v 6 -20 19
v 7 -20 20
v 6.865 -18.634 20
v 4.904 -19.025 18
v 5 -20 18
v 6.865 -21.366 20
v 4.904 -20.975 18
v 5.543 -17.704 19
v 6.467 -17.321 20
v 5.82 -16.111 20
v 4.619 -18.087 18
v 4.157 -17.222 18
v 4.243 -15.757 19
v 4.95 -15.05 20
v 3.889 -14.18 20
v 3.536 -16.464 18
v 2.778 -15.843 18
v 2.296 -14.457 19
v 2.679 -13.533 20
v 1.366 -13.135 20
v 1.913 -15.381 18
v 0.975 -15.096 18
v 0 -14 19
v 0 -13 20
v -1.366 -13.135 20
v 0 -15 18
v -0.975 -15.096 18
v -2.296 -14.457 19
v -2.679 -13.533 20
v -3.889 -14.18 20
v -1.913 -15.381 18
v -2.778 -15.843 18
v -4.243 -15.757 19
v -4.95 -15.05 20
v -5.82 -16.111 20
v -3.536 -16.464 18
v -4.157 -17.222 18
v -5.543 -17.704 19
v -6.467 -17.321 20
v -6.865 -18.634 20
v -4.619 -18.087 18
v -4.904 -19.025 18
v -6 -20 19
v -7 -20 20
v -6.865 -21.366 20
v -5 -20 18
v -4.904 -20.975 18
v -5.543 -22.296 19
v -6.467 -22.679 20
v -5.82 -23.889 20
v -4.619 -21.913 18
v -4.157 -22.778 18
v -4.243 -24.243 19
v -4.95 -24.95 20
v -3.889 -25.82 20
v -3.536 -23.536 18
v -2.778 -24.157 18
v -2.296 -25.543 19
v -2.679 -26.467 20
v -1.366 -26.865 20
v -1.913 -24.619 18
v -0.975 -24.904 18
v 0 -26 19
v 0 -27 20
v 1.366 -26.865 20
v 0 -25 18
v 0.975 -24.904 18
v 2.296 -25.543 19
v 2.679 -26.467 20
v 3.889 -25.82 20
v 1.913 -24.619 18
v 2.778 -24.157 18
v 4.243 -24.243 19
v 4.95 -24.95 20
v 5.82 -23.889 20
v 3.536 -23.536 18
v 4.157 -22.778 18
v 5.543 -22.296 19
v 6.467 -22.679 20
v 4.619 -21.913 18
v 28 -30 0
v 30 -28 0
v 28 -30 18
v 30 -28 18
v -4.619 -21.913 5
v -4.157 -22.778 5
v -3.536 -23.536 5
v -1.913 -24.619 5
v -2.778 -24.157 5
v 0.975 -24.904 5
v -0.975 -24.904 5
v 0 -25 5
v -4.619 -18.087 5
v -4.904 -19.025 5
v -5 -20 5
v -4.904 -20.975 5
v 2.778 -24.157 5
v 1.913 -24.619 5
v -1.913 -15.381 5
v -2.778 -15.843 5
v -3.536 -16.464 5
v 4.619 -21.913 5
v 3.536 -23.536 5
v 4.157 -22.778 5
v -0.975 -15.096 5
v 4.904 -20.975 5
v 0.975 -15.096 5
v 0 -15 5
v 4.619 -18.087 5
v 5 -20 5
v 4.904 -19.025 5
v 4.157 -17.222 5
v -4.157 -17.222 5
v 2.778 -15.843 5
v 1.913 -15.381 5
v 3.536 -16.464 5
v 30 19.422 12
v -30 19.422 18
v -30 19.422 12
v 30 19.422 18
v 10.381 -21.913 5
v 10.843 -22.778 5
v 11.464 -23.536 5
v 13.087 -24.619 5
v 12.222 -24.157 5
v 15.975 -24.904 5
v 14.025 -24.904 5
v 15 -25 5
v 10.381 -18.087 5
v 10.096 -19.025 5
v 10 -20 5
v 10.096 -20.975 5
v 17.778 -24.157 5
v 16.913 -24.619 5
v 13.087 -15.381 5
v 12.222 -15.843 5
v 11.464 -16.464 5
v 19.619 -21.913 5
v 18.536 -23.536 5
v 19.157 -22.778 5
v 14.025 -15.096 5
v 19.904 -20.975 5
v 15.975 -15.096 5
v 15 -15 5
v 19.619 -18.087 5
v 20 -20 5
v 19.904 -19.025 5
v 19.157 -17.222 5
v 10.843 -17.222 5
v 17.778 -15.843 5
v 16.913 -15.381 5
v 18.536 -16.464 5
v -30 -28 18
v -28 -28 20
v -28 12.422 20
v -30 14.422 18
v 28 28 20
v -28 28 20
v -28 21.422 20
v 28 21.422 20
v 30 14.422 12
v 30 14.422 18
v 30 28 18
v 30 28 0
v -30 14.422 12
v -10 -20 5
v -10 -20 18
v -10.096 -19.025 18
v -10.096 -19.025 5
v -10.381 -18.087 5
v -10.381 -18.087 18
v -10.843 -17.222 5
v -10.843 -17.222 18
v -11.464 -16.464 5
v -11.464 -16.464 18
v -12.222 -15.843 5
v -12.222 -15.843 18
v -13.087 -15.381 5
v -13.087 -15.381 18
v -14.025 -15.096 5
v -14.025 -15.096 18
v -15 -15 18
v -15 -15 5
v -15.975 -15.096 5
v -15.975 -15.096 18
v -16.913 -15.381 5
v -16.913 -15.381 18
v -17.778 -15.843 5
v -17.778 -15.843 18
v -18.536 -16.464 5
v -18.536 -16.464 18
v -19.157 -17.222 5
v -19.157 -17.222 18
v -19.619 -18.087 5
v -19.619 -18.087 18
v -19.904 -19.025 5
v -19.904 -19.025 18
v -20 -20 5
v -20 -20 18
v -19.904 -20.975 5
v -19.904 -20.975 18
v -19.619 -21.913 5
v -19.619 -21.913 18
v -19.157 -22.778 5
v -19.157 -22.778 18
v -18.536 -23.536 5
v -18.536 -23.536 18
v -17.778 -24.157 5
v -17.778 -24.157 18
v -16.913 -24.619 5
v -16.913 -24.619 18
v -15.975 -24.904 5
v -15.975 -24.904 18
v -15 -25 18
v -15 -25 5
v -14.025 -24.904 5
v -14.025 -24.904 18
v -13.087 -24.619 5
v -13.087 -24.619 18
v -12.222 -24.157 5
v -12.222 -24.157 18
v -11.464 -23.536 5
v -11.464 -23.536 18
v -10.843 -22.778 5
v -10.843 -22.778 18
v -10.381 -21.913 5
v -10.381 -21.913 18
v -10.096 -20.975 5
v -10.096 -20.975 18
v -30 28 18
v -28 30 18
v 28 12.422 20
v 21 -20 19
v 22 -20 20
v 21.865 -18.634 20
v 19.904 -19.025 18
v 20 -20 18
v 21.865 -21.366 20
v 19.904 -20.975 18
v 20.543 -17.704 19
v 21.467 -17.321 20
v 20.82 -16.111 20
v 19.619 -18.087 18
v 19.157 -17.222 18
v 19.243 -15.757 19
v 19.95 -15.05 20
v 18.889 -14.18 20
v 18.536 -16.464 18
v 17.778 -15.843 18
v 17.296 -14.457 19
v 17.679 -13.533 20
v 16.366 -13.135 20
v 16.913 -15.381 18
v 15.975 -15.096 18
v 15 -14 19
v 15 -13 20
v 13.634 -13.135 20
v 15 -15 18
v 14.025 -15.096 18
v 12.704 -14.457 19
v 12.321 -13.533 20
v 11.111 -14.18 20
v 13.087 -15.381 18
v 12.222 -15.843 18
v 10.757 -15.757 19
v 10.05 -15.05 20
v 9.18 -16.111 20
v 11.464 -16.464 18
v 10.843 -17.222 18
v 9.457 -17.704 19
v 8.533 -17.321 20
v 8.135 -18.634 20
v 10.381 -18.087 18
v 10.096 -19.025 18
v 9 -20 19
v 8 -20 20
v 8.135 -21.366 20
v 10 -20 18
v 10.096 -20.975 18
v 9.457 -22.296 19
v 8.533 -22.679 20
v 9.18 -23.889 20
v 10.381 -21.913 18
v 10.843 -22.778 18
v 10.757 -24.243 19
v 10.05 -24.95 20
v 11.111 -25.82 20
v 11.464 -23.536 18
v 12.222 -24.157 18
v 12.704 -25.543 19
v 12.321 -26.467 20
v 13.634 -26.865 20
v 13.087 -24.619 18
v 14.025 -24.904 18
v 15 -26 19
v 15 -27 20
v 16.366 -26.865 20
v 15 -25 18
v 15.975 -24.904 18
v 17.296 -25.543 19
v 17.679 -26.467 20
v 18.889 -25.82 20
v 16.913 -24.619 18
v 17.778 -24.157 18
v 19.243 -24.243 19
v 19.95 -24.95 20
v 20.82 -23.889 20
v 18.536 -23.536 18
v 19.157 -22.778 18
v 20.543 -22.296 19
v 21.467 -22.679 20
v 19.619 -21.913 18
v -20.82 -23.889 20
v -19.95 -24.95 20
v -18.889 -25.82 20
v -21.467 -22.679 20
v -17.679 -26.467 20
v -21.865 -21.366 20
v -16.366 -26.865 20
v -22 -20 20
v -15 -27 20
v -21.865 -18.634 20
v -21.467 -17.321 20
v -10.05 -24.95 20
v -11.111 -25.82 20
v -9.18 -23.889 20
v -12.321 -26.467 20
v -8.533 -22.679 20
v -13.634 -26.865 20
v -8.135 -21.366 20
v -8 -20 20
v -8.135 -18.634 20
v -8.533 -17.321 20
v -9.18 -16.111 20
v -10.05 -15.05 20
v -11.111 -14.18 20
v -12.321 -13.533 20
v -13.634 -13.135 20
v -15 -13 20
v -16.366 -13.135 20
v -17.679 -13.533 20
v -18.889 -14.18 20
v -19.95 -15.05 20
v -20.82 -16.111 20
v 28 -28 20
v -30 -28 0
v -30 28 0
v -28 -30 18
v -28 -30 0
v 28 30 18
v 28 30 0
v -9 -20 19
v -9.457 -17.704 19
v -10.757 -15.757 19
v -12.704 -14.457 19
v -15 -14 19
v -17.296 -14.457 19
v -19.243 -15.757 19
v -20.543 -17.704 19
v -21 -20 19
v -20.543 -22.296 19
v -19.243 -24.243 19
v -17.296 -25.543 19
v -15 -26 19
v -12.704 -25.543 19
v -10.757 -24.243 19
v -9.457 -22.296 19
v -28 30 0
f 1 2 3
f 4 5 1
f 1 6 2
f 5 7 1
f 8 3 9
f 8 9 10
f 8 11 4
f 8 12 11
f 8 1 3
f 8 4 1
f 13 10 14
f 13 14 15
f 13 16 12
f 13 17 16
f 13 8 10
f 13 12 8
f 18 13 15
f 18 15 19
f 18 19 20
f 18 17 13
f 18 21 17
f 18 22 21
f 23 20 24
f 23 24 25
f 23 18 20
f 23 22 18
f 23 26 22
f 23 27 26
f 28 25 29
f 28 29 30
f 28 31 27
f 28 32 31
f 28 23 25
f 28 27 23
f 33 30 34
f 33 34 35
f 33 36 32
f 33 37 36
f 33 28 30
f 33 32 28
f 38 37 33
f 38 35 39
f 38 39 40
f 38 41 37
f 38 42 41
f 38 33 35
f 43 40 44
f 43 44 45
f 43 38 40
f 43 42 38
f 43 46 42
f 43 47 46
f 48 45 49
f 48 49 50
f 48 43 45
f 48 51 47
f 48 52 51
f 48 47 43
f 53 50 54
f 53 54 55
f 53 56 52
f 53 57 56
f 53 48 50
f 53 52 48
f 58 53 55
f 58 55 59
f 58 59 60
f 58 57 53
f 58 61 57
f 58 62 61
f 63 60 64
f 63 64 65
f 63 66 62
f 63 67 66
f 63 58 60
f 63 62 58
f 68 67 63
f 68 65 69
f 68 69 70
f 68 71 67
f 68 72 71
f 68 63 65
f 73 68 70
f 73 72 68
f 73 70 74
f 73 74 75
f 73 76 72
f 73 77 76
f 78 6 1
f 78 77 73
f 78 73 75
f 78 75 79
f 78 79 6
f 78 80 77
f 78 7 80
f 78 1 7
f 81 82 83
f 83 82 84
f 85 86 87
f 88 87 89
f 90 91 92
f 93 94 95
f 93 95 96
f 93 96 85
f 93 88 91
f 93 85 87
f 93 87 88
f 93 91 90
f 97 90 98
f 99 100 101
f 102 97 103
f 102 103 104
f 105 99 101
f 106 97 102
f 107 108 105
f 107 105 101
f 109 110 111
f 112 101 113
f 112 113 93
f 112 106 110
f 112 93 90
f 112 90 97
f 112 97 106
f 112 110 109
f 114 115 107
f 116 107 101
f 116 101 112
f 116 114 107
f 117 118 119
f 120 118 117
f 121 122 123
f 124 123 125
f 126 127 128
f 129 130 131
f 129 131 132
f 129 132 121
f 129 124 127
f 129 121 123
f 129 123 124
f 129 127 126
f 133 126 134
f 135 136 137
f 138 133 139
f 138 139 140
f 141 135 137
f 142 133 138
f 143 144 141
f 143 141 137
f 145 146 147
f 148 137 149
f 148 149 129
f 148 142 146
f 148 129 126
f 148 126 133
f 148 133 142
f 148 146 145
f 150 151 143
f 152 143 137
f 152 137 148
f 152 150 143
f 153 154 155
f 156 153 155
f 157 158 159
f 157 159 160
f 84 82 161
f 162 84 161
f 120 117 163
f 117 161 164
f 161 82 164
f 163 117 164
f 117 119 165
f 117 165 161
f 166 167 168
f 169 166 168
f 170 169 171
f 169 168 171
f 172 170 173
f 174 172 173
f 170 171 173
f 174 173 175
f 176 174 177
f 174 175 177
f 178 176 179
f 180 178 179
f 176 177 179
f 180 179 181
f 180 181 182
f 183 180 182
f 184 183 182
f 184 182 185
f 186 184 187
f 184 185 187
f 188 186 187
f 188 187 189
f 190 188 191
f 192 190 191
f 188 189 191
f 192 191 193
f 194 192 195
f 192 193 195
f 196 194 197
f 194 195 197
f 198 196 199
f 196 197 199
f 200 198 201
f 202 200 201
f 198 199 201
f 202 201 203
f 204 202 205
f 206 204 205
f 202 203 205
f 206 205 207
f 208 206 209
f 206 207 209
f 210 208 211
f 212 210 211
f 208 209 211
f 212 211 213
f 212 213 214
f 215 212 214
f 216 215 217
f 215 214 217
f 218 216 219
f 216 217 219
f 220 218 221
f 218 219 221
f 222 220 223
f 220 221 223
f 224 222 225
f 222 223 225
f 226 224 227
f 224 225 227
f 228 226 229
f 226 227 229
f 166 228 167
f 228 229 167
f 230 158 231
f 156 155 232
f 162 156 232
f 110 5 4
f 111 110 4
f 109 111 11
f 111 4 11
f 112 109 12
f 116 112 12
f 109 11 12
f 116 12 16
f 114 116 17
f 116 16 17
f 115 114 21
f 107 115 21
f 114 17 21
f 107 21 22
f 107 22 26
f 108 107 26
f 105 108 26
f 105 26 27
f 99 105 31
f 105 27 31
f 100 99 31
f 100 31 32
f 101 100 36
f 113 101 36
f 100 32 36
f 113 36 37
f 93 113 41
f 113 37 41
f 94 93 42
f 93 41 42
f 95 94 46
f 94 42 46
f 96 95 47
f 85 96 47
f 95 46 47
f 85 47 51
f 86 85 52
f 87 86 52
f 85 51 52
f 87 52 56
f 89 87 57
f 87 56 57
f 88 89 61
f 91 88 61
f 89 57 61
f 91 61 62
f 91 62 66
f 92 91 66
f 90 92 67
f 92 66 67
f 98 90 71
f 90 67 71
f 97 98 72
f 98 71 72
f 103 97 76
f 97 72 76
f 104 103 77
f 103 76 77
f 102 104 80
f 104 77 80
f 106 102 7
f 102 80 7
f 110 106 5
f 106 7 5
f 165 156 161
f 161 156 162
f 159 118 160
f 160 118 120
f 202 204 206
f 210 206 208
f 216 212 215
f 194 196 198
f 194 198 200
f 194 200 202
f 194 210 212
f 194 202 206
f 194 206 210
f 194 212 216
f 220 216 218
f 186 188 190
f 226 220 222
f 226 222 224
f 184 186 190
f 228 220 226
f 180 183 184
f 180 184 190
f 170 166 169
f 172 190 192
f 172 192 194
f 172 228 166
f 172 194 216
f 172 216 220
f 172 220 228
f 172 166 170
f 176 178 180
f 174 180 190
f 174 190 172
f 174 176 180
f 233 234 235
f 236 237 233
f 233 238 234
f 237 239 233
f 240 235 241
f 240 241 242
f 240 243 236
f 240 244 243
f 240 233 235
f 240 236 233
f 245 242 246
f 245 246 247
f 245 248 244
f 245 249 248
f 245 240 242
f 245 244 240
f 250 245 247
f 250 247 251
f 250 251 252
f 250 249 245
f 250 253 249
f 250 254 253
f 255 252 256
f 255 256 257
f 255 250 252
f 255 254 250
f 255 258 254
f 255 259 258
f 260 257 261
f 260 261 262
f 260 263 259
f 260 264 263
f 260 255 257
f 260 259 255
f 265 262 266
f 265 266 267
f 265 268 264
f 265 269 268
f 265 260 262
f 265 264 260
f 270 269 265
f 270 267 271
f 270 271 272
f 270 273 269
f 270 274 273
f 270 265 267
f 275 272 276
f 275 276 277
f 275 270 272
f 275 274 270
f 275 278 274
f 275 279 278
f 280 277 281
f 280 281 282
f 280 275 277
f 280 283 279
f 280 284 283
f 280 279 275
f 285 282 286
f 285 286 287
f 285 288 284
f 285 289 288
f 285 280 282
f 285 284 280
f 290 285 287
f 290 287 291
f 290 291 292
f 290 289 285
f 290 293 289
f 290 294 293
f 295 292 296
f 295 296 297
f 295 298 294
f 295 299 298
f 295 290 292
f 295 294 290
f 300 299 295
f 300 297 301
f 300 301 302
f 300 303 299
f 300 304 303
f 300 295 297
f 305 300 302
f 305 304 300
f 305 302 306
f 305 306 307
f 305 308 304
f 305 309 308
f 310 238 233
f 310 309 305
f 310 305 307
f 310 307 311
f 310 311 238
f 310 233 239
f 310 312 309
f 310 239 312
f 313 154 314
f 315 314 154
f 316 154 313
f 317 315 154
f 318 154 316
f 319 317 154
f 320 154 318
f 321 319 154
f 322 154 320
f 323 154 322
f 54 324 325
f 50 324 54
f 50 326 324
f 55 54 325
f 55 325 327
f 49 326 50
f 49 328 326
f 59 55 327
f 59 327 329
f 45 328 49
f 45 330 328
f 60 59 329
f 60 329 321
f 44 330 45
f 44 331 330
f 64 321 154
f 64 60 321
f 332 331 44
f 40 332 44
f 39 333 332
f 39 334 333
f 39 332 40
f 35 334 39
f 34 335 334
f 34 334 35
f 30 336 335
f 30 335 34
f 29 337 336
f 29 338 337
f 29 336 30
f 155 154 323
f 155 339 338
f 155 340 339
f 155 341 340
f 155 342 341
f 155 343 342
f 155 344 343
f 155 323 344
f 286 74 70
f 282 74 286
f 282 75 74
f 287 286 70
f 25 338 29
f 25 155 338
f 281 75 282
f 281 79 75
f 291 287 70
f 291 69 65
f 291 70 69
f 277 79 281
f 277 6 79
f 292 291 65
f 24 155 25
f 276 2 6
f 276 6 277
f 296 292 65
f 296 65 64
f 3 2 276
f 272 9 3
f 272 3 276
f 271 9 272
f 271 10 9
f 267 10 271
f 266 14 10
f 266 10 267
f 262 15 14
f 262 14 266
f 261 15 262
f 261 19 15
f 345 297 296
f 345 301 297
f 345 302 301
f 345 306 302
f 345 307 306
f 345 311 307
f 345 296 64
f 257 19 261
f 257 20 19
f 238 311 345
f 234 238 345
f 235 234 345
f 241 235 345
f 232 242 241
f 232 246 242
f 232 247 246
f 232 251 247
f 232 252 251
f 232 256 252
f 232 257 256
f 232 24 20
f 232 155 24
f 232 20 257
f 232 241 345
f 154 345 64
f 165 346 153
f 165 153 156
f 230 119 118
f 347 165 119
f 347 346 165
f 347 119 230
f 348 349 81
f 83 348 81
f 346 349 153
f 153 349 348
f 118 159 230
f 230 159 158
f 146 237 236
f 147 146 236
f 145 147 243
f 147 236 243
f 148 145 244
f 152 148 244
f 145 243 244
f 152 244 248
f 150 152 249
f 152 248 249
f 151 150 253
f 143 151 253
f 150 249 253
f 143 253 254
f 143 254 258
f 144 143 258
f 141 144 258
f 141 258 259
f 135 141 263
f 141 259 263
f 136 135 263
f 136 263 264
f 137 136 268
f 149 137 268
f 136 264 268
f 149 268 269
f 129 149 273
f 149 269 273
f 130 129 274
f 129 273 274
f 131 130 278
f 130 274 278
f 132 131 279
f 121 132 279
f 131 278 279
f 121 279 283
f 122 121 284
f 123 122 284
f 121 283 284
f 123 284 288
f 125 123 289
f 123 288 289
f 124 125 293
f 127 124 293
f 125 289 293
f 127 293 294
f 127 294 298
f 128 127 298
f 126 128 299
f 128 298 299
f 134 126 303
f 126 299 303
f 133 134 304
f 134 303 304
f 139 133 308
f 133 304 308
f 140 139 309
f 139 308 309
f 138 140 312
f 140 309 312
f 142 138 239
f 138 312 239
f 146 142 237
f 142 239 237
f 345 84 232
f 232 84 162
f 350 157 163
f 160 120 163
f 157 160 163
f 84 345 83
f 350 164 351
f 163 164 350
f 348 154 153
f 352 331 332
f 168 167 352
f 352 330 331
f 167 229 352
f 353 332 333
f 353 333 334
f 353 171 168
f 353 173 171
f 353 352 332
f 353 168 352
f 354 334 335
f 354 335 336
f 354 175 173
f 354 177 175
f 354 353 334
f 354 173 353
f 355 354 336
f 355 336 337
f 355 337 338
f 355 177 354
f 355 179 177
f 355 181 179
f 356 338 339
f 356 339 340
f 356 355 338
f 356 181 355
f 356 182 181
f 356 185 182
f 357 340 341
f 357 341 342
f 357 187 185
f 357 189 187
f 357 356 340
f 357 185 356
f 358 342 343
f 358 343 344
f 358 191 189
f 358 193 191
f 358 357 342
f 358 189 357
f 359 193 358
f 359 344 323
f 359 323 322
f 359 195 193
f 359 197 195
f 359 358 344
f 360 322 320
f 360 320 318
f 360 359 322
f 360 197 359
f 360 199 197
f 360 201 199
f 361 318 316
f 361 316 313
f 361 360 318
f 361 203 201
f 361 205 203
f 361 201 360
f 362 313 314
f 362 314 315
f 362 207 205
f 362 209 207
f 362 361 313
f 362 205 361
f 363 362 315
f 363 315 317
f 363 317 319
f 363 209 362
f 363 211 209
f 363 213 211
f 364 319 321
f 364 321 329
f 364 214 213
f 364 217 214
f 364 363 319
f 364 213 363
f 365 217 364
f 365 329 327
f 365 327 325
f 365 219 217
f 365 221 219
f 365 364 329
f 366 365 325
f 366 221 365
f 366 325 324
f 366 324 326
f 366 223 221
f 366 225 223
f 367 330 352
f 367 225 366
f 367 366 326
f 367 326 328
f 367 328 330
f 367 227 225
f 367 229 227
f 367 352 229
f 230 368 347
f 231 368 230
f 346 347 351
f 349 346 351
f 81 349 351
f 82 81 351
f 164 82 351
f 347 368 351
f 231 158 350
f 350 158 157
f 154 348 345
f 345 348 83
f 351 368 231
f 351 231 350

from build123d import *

# Parameters (mm, degrees)
F0_W     = 60
F0_H     = 60
F1_DEPTH = 20
F2_W     = 60
F2_H     = 5
F3_DEPTH = 8
F4_R     = 5
F5_DEPTH = 15
F6_SIZE  = 2


with BuildPart() as f1:
    # F0 (on Top) → F1 (new body)
    with BuildSketch(Plane.XY):
        Rectangle(F0_W, F0_H)
    extrude(amount=F1_DEPTH)

    # F2 (on face) → F3 (cut)
    with BuildSketch(Plane.XY.offset(20)):
        with Locations((0, 16.9222388044)):
            Rectangle(F2_W, F2_H)
    extrude(amount=-F3_DEPTH, mode=Mode.SUBTRACT)

    # F4 (on face) → F5 (cut)
    with BuildSketch(Plane.XY.offset(20)):
        with Locations((0, -20)):
            Circle(F4_R)
        with Locations((15, -20)):
            Circle(F4_R)
        with Locations((-15, -20)):
            Circle(F4_R)
    extrude(amount=-F5_DEPTH, mode=Mode.SUBTRACT)

    # F6
    f6_edges = [f1.edges().sort_by_distance(p)[0] for p in [
        (0, -30, 20),
        (30, -7.788881, 20),
        (30, 24.711119, 20),
        (0, 30, 20),
        (-30, -7.788881, 20),
        (-30, 24.711119, 20),
        (10, -20, 20),
        (-5, -20, 20),
        (-20, -20, 20),
        (0, 19.422239, 20),
        (0, 14.422239, 20),
        (30, -30, 10),
        (-30, -30, 10),
        (-30, 30, 10),
        (30, 30, 10),
    ]]
    chamfer(f6_edges, length=F6_SIZE)


solid = f1.part
